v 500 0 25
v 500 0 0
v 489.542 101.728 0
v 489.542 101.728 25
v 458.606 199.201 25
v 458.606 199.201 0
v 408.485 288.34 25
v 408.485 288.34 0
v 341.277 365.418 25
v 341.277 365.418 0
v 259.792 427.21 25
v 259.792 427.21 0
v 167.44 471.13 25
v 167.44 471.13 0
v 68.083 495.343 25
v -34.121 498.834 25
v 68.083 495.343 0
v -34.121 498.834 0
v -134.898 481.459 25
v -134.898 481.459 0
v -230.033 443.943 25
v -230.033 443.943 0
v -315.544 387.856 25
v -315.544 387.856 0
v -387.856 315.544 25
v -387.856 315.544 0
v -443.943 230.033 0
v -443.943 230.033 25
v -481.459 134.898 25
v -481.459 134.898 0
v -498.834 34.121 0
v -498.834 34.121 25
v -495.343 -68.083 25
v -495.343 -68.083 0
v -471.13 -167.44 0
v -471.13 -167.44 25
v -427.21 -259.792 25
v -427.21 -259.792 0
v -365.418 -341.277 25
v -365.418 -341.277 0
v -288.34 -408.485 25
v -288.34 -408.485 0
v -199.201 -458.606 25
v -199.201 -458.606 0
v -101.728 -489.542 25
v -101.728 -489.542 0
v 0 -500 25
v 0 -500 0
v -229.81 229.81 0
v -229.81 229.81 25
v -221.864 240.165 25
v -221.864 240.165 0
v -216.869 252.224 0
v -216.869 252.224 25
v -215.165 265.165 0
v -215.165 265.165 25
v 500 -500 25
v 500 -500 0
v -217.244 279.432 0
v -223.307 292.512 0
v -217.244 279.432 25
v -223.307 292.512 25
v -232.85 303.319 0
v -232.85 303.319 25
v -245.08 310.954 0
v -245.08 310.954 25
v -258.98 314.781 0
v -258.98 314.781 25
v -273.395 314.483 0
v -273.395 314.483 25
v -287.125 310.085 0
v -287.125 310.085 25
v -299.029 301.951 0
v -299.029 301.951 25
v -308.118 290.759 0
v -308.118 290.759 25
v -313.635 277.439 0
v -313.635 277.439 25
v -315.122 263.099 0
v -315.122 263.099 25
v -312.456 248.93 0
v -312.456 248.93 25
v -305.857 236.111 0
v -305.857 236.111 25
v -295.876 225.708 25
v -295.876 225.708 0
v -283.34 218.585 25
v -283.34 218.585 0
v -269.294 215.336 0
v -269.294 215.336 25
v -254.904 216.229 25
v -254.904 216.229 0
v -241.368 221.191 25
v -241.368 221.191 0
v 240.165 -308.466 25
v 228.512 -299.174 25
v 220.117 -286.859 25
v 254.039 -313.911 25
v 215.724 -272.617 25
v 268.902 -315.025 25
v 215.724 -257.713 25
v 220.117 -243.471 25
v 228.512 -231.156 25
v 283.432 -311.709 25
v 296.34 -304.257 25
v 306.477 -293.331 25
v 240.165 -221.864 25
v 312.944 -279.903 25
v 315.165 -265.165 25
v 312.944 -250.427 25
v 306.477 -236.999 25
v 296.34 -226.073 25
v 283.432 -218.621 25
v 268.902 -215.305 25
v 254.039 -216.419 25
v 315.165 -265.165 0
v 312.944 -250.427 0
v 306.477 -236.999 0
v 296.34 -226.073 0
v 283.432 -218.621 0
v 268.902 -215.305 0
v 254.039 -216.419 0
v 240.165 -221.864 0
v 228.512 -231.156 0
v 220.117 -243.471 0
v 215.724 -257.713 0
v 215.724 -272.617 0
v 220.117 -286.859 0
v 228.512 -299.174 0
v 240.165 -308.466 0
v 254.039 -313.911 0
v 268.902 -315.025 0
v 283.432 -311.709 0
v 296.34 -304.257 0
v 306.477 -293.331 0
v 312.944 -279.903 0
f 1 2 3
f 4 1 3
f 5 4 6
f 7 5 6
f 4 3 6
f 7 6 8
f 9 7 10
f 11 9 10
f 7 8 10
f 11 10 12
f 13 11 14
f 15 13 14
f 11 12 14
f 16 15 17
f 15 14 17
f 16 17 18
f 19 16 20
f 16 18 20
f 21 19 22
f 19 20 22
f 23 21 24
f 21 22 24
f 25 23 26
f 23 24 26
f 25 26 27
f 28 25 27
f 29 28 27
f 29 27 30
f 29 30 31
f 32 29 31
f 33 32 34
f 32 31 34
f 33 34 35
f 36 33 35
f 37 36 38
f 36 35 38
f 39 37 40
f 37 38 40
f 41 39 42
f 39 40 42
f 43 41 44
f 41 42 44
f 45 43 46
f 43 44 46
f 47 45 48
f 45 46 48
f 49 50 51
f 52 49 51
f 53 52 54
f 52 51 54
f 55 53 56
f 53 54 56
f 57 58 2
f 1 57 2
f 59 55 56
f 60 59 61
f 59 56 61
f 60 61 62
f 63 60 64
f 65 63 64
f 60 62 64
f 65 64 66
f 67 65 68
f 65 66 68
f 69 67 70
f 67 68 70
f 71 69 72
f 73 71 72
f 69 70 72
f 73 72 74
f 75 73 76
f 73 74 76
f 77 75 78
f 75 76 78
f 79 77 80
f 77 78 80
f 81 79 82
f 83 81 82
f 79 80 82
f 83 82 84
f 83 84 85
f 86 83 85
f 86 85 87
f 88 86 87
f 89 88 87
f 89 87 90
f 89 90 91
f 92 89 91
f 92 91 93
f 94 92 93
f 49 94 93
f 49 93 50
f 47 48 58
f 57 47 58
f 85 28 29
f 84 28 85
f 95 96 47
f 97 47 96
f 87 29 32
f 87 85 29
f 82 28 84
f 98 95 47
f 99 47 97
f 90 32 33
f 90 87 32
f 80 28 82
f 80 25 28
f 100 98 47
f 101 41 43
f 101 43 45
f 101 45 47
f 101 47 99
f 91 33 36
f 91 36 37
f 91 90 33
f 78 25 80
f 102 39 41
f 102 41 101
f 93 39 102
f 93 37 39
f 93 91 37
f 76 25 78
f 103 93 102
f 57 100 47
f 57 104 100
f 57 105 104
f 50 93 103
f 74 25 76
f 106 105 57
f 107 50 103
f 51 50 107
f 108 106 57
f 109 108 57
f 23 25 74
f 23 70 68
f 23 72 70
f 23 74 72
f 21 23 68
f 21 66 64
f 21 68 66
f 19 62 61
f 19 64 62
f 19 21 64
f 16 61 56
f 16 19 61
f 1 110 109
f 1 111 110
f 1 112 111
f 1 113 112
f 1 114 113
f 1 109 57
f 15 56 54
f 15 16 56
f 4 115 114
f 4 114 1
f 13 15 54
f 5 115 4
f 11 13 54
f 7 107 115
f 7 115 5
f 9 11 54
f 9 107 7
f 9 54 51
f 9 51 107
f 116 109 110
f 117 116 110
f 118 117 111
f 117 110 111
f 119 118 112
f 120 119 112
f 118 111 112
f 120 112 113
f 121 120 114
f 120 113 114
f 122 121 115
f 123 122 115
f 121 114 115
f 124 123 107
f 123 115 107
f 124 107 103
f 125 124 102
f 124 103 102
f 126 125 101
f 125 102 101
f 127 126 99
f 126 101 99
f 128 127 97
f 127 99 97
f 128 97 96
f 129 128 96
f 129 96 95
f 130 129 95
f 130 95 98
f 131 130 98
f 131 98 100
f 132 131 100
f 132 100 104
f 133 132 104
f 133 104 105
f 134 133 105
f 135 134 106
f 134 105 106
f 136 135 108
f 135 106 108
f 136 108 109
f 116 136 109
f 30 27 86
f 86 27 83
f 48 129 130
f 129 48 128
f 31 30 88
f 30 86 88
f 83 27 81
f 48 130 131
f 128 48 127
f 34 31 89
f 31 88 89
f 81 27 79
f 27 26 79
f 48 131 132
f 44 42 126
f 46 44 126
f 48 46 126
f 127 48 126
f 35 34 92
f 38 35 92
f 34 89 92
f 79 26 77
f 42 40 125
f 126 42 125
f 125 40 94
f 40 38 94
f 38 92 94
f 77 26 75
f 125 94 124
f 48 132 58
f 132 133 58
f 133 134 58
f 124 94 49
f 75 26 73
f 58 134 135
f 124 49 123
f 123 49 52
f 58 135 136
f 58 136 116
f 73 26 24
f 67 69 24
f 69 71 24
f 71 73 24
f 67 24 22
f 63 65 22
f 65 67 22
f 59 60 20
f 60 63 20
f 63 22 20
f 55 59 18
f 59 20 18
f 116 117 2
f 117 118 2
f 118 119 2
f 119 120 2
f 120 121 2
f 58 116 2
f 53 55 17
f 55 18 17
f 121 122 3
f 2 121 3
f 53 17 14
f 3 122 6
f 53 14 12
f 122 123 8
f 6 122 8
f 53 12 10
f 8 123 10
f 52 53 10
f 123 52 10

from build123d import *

# Parameters (mm, degrees)
F1_DEPTH = 25
F2_R     = 50
F3_DEPTH = 25


with BuildPart() as f1:
    # F0 (on Top) → F1 (new body)
    with BuildSketch(Plane.XY):
        with BuildLine():
            Line((500, -500), (500, 0))
            ThreePointArc((500, 0), (-353.553391, 353.553391), (0, -500))
            Line((0, -500), (500, -500))
        make_face()
    extrude(amount=F1_DEPTH)

    # F2 (on face) → F3 (cut, through all)
    with BuildSketch(Plane.XY.offset(25)):
        with BuildLine():
            ThreePointArc((-229.809704, 229.809704), (-218.971066, 246.030871), (-215.165043, 265.165043))
            ThreePointArc((-215.165043, 265.165043), (-311.35902, 284.299215), (-229.809704, 229.809704))
        make_face()
        with Locations((265.165043, -265.165043)):
            Circle(F2_R)
    extrude(amount=-F3_DEPTH, mode=Mode.SUBTRACT)


solid = f1.part
